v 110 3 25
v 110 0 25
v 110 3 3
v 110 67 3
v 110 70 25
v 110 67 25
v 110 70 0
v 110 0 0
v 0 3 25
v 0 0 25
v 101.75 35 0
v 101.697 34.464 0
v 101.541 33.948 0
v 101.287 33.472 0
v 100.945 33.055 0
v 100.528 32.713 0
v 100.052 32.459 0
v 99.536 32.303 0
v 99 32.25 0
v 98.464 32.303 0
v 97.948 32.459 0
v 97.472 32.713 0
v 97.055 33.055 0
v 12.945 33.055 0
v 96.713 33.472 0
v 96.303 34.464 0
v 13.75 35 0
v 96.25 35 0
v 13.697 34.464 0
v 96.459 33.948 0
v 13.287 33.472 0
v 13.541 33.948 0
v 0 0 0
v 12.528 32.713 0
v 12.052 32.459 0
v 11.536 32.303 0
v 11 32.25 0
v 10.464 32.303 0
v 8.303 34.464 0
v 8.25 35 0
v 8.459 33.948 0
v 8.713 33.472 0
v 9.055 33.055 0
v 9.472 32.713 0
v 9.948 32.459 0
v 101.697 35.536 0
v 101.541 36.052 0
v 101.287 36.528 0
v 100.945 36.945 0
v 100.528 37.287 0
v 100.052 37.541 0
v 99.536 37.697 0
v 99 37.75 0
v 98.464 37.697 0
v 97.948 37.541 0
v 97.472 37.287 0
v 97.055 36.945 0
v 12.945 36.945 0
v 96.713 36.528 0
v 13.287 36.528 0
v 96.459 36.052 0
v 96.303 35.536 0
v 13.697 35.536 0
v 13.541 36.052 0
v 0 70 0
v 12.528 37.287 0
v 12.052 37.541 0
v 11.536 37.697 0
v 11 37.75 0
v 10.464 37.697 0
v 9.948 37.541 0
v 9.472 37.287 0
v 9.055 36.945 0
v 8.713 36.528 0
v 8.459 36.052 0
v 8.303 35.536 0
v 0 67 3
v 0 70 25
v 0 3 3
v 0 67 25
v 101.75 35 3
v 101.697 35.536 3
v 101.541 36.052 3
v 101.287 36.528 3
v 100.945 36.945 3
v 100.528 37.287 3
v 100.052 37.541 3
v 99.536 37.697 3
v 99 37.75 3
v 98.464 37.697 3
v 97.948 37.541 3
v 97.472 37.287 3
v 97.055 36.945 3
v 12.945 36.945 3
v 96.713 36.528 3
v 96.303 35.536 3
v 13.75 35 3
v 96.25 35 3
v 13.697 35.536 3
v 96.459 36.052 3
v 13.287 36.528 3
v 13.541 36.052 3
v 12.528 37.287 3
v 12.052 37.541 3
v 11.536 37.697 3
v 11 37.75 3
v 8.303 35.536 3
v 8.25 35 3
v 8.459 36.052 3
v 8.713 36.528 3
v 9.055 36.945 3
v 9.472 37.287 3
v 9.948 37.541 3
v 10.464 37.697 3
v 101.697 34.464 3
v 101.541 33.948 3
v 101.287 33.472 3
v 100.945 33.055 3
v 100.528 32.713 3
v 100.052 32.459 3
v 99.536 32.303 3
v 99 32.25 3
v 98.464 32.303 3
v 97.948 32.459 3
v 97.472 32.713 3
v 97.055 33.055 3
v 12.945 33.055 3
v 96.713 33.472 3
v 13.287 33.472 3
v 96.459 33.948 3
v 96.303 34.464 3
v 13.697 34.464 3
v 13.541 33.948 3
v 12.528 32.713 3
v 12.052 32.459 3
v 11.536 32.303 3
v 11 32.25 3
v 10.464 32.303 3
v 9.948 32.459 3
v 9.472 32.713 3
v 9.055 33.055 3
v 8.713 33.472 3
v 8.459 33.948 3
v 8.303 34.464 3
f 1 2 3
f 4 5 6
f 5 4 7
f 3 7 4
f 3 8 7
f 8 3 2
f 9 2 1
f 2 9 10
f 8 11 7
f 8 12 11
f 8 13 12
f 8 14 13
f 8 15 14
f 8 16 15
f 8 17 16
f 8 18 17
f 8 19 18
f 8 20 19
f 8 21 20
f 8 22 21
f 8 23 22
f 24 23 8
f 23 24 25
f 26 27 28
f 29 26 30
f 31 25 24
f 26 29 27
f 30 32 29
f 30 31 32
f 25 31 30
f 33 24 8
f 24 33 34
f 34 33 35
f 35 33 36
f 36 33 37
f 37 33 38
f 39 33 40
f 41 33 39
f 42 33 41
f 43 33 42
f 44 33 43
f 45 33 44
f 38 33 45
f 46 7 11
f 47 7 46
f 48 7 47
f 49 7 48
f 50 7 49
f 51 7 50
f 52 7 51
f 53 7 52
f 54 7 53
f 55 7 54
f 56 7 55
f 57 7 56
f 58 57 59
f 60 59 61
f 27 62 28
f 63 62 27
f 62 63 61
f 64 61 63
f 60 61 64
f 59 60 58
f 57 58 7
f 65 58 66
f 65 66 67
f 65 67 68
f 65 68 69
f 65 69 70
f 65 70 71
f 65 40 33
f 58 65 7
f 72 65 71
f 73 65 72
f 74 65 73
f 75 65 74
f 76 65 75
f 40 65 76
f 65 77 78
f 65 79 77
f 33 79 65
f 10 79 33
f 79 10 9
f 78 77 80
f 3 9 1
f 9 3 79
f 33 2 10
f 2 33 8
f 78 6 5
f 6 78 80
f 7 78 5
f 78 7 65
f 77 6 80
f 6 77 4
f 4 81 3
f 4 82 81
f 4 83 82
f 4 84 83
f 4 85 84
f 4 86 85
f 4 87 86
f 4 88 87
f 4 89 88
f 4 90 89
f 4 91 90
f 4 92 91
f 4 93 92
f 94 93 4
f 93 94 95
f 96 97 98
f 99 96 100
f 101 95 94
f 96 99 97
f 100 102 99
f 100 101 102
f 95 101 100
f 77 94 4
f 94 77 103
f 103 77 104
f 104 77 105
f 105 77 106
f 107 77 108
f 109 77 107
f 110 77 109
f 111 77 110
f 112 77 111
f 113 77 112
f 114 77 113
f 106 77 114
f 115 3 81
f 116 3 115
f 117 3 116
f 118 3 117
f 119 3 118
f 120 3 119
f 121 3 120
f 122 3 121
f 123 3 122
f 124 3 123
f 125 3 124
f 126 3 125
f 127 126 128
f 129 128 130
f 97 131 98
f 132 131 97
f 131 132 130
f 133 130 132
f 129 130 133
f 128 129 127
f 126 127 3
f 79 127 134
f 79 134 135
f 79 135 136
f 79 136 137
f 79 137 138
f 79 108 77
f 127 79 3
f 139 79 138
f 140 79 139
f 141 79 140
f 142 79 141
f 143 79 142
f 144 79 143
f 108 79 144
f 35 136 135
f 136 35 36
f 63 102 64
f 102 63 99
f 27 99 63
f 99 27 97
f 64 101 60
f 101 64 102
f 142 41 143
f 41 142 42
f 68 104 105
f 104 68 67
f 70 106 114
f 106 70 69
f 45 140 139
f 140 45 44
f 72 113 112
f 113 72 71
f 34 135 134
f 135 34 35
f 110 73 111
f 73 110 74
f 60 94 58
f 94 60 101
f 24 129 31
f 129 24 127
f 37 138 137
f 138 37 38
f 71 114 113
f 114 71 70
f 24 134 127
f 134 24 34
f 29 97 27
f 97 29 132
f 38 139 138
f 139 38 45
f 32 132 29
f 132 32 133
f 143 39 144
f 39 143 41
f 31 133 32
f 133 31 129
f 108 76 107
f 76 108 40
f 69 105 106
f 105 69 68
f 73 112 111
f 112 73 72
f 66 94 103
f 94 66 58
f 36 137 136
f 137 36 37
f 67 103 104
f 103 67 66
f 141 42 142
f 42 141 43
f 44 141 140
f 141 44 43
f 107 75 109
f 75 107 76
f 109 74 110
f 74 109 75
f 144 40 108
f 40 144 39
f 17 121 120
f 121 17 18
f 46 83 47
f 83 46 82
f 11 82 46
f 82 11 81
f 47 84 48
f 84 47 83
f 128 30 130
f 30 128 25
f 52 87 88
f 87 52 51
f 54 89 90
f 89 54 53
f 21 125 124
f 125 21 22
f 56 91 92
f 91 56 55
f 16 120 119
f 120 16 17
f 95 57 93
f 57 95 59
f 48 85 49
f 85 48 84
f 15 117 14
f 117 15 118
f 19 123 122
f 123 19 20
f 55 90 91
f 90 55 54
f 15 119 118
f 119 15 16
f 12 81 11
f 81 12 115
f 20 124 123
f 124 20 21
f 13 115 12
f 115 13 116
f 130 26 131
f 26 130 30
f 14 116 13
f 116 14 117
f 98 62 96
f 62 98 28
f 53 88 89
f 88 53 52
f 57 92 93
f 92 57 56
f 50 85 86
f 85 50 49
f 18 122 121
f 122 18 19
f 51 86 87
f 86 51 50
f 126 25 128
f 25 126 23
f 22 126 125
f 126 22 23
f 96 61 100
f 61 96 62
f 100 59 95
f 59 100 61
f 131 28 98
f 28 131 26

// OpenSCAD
$fn = 32;

// ----------------------------------------------------------------------
// U-bracket: 110 x 70 x 25 mm
// ----------------------------------------------------------------------

// --- parameters (mm) ---
length = 110;             // outer length, X
width = 70;               // outer width, Y
height = 25;              // upright height, Z
thick = 3;                // wall thickness
hole_d = 5.5;             // clearance for M5

module hole_z(px, py) {
  translate([px, py, -0.5]) cylinder(h = thick + 1, d = hole_d);
}
module hole_y_pz(pz) {
  /* through both uprights along Y */
  translate([0, -0.5, pz]) rotate([-90, 0, 0]) cylinder(h = width + 1, d = hole_d);
}

module base() {
  cube([length, width, thick]);
}

module uprights() {
  cube([length, thick, height]);
  translate([0, width - thick, 0]) cube([length, thick, height]);
}

difference() {
  union() {
    base();
    uprights();
  }
  hole_z(11, 35);
  hole_z(99, 35);
}
